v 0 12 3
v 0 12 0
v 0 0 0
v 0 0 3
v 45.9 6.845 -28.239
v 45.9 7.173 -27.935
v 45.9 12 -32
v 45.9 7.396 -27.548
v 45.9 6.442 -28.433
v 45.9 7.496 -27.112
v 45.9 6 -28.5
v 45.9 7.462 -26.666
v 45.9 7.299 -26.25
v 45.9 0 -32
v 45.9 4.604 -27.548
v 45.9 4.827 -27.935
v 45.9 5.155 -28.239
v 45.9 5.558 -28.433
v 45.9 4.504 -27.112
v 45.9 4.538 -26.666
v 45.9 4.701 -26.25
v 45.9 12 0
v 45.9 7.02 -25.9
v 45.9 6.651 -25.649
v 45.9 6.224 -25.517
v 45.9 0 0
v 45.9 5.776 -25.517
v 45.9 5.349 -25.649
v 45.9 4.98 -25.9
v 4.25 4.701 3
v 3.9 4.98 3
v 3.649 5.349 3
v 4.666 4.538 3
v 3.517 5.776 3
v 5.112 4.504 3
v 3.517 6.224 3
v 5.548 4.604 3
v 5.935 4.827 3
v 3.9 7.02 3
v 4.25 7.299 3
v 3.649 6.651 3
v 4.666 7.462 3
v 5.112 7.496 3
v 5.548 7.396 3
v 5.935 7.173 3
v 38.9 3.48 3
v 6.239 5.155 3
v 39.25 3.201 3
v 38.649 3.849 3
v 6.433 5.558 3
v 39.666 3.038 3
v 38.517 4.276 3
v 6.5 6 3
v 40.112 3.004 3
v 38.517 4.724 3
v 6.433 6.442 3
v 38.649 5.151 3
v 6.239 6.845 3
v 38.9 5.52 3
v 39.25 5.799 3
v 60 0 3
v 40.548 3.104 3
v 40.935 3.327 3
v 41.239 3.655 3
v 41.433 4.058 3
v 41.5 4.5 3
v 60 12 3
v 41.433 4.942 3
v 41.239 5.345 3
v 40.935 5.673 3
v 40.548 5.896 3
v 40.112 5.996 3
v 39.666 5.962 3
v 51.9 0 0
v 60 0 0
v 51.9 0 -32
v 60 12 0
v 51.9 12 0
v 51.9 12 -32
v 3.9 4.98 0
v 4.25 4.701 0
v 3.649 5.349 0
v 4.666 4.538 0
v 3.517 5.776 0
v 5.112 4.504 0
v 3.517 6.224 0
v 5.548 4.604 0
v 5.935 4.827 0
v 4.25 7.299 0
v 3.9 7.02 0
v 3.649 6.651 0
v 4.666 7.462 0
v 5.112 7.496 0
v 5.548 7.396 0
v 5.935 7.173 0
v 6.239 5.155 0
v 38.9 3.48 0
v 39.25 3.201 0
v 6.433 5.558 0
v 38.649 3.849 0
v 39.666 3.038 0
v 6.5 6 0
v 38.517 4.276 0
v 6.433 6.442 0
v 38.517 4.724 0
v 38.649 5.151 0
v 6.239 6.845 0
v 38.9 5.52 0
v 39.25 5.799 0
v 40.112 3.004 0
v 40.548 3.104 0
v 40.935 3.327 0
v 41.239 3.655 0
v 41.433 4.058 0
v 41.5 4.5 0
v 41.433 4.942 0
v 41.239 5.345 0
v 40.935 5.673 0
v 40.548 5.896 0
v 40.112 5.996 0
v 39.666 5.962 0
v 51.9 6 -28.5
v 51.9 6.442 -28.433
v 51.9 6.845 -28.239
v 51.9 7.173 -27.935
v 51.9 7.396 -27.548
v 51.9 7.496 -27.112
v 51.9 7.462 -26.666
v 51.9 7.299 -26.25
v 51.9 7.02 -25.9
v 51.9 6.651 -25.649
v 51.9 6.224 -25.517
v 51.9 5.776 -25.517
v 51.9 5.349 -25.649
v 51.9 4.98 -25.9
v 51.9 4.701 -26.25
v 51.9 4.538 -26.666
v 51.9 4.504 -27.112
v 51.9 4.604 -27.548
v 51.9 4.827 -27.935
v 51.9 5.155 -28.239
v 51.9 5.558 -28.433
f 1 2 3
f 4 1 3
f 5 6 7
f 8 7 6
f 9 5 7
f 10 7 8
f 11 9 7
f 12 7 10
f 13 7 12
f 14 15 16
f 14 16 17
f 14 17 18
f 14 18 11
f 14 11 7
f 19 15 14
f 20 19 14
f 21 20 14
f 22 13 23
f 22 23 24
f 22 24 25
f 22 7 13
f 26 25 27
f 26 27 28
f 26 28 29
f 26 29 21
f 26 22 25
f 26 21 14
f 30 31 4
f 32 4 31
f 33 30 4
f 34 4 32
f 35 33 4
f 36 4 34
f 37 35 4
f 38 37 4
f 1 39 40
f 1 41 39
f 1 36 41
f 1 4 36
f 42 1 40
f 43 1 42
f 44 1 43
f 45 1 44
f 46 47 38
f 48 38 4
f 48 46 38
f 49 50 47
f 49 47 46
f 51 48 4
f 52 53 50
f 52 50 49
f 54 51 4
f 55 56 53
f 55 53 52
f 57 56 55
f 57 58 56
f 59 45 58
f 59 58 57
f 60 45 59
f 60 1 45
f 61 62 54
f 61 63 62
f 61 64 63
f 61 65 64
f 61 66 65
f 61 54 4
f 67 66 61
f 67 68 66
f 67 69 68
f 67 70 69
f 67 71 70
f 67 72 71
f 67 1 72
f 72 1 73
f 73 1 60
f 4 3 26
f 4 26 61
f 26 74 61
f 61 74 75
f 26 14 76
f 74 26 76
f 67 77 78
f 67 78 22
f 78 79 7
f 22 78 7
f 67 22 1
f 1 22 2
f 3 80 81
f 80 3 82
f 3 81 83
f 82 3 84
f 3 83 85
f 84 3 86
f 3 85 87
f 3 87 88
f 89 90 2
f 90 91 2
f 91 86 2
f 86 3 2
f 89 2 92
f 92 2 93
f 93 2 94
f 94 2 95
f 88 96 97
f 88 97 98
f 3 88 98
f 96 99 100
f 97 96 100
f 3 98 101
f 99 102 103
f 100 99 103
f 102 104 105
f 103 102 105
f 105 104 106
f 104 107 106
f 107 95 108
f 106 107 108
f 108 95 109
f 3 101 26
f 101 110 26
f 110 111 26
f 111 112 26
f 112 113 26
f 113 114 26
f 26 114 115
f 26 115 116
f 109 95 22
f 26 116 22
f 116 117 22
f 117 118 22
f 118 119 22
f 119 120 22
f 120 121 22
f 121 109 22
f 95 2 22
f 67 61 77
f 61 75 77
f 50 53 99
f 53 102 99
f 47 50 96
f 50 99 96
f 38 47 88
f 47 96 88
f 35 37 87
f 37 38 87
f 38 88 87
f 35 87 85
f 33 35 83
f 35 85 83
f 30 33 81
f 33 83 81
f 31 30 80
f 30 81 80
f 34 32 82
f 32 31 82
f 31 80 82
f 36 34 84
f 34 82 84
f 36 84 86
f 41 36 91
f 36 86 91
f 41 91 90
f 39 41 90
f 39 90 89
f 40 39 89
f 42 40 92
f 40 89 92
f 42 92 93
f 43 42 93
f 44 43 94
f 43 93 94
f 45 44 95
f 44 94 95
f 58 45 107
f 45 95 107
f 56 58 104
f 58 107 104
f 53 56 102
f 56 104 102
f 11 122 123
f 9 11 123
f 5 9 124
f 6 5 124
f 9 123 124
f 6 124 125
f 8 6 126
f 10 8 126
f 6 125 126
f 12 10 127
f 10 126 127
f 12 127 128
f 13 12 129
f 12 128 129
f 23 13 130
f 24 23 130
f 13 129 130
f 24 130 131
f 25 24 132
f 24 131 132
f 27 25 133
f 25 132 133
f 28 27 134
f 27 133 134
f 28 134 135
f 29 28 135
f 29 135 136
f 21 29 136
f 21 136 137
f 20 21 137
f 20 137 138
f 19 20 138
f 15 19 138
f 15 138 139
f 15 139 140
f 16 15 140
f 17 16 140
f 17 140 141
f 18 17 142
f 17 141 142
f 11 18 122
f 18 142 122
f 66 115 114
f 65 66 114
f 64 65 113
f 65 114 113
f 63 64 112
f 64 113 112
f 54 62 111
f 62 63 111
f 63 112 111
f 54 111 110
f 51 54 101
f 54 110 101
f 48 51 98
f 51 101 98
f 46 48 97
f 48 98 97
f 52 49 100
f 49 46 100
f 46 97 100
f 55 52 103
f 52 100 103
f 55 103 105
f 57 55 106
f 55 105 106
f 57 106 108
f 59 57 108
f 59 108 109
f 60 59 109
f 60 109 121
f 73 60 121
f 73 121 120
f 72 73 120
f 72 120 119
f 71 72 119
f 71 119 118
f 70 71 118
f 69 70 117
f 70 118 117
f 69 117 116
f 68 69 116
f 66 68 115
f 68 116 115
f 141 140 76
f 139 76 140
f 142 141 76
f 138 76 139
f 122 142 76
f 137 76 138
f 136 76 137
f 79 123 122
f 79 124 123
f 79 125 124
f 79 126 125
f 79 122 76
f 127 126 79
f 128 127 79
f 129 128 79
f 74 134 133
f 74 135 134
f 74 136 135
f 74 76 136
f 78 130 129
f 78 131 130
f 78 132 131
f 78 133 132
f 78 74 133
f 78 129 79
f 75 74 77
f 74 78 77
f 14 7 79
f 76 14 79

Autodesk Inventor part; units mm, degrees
ref_plane "YZ Plane" through (0, 0, 0) normal (1, 0, 0) x (0, 1, 0)
ref_plane "XZ Plane" through (0, 0, 0) normal (0, 1, 0) x (-1, 0, 0)
ref_plane "XY Plane" through (0, 0, 0) normal (0, 0, 1) x (1, 0, 0)
sketch "Sketch3" plane through (0, 0, 0) normal (0, 0, 1) x (1, 0, 0)
  line L0 (0, 0) -> (60, 0)
  line L1 (60, 0) -> (60, 12)
  line L2 (60, 12) -> (0, 12)
  line L3 (0, 12) -> (0, 0)
  circle A0 centre (40, 4.5) radius 1.5
  circle A1 centre (5, 6) radius 1.5
  dimension "d0" = 60
  dimension "d2" = 3
  dimension "d3" = 4.5
  dimension "d4" = 12
  dimension "d8" = 20
  dimension "d17" = 3
  dimension "d18" = 5
extrude "Extrusion1" add sketch "Sketch3" along normal blind 3
sketch "Sketch4" plane through (0, 0, 3) normal (0, 0, 1) x (1, 0, 0)
  line L0 (60, 12) -> (0, 12) projected
  line L1 (45.9, 0) -> (51.9, 0)
  line L2 (51.9, 0) -> (51.9, 12)
  line L3 (51.9, 12) -> (45.9, 12)
  line L4 (45.9, 12) -> (45.9, 0)
  circle A0 centre (40, 4.5) radius 1.5 projected
  point P0 (0, 0)
  dimension "d9" = 6
  dimension "d10" = 5.9
extrude "Extrusion2" add sketch "Sketch4" against normal blind 35 contours L2 L1 L4 L0
sketch "Sketch5" plane through (51.9, 0, 0) normal (1, 0, 0) x (0, 0, -1)
  line L0 (32, 0) -> (32, 12) construction
  line L1 (0, 6) -> (0, 3) construction
  line L2 (32, 6) -> (0, 6) construction
  circle A0 centre (27, 6) radius 1.5
  point P0 (0, 0)
  dimension "d13" = 3
  dimension "d14" = 5
extrude "Extrusion3" cut sketch "Sketch5" against normal through all
properties part number "thumper-bumper-solenoid-interface"
